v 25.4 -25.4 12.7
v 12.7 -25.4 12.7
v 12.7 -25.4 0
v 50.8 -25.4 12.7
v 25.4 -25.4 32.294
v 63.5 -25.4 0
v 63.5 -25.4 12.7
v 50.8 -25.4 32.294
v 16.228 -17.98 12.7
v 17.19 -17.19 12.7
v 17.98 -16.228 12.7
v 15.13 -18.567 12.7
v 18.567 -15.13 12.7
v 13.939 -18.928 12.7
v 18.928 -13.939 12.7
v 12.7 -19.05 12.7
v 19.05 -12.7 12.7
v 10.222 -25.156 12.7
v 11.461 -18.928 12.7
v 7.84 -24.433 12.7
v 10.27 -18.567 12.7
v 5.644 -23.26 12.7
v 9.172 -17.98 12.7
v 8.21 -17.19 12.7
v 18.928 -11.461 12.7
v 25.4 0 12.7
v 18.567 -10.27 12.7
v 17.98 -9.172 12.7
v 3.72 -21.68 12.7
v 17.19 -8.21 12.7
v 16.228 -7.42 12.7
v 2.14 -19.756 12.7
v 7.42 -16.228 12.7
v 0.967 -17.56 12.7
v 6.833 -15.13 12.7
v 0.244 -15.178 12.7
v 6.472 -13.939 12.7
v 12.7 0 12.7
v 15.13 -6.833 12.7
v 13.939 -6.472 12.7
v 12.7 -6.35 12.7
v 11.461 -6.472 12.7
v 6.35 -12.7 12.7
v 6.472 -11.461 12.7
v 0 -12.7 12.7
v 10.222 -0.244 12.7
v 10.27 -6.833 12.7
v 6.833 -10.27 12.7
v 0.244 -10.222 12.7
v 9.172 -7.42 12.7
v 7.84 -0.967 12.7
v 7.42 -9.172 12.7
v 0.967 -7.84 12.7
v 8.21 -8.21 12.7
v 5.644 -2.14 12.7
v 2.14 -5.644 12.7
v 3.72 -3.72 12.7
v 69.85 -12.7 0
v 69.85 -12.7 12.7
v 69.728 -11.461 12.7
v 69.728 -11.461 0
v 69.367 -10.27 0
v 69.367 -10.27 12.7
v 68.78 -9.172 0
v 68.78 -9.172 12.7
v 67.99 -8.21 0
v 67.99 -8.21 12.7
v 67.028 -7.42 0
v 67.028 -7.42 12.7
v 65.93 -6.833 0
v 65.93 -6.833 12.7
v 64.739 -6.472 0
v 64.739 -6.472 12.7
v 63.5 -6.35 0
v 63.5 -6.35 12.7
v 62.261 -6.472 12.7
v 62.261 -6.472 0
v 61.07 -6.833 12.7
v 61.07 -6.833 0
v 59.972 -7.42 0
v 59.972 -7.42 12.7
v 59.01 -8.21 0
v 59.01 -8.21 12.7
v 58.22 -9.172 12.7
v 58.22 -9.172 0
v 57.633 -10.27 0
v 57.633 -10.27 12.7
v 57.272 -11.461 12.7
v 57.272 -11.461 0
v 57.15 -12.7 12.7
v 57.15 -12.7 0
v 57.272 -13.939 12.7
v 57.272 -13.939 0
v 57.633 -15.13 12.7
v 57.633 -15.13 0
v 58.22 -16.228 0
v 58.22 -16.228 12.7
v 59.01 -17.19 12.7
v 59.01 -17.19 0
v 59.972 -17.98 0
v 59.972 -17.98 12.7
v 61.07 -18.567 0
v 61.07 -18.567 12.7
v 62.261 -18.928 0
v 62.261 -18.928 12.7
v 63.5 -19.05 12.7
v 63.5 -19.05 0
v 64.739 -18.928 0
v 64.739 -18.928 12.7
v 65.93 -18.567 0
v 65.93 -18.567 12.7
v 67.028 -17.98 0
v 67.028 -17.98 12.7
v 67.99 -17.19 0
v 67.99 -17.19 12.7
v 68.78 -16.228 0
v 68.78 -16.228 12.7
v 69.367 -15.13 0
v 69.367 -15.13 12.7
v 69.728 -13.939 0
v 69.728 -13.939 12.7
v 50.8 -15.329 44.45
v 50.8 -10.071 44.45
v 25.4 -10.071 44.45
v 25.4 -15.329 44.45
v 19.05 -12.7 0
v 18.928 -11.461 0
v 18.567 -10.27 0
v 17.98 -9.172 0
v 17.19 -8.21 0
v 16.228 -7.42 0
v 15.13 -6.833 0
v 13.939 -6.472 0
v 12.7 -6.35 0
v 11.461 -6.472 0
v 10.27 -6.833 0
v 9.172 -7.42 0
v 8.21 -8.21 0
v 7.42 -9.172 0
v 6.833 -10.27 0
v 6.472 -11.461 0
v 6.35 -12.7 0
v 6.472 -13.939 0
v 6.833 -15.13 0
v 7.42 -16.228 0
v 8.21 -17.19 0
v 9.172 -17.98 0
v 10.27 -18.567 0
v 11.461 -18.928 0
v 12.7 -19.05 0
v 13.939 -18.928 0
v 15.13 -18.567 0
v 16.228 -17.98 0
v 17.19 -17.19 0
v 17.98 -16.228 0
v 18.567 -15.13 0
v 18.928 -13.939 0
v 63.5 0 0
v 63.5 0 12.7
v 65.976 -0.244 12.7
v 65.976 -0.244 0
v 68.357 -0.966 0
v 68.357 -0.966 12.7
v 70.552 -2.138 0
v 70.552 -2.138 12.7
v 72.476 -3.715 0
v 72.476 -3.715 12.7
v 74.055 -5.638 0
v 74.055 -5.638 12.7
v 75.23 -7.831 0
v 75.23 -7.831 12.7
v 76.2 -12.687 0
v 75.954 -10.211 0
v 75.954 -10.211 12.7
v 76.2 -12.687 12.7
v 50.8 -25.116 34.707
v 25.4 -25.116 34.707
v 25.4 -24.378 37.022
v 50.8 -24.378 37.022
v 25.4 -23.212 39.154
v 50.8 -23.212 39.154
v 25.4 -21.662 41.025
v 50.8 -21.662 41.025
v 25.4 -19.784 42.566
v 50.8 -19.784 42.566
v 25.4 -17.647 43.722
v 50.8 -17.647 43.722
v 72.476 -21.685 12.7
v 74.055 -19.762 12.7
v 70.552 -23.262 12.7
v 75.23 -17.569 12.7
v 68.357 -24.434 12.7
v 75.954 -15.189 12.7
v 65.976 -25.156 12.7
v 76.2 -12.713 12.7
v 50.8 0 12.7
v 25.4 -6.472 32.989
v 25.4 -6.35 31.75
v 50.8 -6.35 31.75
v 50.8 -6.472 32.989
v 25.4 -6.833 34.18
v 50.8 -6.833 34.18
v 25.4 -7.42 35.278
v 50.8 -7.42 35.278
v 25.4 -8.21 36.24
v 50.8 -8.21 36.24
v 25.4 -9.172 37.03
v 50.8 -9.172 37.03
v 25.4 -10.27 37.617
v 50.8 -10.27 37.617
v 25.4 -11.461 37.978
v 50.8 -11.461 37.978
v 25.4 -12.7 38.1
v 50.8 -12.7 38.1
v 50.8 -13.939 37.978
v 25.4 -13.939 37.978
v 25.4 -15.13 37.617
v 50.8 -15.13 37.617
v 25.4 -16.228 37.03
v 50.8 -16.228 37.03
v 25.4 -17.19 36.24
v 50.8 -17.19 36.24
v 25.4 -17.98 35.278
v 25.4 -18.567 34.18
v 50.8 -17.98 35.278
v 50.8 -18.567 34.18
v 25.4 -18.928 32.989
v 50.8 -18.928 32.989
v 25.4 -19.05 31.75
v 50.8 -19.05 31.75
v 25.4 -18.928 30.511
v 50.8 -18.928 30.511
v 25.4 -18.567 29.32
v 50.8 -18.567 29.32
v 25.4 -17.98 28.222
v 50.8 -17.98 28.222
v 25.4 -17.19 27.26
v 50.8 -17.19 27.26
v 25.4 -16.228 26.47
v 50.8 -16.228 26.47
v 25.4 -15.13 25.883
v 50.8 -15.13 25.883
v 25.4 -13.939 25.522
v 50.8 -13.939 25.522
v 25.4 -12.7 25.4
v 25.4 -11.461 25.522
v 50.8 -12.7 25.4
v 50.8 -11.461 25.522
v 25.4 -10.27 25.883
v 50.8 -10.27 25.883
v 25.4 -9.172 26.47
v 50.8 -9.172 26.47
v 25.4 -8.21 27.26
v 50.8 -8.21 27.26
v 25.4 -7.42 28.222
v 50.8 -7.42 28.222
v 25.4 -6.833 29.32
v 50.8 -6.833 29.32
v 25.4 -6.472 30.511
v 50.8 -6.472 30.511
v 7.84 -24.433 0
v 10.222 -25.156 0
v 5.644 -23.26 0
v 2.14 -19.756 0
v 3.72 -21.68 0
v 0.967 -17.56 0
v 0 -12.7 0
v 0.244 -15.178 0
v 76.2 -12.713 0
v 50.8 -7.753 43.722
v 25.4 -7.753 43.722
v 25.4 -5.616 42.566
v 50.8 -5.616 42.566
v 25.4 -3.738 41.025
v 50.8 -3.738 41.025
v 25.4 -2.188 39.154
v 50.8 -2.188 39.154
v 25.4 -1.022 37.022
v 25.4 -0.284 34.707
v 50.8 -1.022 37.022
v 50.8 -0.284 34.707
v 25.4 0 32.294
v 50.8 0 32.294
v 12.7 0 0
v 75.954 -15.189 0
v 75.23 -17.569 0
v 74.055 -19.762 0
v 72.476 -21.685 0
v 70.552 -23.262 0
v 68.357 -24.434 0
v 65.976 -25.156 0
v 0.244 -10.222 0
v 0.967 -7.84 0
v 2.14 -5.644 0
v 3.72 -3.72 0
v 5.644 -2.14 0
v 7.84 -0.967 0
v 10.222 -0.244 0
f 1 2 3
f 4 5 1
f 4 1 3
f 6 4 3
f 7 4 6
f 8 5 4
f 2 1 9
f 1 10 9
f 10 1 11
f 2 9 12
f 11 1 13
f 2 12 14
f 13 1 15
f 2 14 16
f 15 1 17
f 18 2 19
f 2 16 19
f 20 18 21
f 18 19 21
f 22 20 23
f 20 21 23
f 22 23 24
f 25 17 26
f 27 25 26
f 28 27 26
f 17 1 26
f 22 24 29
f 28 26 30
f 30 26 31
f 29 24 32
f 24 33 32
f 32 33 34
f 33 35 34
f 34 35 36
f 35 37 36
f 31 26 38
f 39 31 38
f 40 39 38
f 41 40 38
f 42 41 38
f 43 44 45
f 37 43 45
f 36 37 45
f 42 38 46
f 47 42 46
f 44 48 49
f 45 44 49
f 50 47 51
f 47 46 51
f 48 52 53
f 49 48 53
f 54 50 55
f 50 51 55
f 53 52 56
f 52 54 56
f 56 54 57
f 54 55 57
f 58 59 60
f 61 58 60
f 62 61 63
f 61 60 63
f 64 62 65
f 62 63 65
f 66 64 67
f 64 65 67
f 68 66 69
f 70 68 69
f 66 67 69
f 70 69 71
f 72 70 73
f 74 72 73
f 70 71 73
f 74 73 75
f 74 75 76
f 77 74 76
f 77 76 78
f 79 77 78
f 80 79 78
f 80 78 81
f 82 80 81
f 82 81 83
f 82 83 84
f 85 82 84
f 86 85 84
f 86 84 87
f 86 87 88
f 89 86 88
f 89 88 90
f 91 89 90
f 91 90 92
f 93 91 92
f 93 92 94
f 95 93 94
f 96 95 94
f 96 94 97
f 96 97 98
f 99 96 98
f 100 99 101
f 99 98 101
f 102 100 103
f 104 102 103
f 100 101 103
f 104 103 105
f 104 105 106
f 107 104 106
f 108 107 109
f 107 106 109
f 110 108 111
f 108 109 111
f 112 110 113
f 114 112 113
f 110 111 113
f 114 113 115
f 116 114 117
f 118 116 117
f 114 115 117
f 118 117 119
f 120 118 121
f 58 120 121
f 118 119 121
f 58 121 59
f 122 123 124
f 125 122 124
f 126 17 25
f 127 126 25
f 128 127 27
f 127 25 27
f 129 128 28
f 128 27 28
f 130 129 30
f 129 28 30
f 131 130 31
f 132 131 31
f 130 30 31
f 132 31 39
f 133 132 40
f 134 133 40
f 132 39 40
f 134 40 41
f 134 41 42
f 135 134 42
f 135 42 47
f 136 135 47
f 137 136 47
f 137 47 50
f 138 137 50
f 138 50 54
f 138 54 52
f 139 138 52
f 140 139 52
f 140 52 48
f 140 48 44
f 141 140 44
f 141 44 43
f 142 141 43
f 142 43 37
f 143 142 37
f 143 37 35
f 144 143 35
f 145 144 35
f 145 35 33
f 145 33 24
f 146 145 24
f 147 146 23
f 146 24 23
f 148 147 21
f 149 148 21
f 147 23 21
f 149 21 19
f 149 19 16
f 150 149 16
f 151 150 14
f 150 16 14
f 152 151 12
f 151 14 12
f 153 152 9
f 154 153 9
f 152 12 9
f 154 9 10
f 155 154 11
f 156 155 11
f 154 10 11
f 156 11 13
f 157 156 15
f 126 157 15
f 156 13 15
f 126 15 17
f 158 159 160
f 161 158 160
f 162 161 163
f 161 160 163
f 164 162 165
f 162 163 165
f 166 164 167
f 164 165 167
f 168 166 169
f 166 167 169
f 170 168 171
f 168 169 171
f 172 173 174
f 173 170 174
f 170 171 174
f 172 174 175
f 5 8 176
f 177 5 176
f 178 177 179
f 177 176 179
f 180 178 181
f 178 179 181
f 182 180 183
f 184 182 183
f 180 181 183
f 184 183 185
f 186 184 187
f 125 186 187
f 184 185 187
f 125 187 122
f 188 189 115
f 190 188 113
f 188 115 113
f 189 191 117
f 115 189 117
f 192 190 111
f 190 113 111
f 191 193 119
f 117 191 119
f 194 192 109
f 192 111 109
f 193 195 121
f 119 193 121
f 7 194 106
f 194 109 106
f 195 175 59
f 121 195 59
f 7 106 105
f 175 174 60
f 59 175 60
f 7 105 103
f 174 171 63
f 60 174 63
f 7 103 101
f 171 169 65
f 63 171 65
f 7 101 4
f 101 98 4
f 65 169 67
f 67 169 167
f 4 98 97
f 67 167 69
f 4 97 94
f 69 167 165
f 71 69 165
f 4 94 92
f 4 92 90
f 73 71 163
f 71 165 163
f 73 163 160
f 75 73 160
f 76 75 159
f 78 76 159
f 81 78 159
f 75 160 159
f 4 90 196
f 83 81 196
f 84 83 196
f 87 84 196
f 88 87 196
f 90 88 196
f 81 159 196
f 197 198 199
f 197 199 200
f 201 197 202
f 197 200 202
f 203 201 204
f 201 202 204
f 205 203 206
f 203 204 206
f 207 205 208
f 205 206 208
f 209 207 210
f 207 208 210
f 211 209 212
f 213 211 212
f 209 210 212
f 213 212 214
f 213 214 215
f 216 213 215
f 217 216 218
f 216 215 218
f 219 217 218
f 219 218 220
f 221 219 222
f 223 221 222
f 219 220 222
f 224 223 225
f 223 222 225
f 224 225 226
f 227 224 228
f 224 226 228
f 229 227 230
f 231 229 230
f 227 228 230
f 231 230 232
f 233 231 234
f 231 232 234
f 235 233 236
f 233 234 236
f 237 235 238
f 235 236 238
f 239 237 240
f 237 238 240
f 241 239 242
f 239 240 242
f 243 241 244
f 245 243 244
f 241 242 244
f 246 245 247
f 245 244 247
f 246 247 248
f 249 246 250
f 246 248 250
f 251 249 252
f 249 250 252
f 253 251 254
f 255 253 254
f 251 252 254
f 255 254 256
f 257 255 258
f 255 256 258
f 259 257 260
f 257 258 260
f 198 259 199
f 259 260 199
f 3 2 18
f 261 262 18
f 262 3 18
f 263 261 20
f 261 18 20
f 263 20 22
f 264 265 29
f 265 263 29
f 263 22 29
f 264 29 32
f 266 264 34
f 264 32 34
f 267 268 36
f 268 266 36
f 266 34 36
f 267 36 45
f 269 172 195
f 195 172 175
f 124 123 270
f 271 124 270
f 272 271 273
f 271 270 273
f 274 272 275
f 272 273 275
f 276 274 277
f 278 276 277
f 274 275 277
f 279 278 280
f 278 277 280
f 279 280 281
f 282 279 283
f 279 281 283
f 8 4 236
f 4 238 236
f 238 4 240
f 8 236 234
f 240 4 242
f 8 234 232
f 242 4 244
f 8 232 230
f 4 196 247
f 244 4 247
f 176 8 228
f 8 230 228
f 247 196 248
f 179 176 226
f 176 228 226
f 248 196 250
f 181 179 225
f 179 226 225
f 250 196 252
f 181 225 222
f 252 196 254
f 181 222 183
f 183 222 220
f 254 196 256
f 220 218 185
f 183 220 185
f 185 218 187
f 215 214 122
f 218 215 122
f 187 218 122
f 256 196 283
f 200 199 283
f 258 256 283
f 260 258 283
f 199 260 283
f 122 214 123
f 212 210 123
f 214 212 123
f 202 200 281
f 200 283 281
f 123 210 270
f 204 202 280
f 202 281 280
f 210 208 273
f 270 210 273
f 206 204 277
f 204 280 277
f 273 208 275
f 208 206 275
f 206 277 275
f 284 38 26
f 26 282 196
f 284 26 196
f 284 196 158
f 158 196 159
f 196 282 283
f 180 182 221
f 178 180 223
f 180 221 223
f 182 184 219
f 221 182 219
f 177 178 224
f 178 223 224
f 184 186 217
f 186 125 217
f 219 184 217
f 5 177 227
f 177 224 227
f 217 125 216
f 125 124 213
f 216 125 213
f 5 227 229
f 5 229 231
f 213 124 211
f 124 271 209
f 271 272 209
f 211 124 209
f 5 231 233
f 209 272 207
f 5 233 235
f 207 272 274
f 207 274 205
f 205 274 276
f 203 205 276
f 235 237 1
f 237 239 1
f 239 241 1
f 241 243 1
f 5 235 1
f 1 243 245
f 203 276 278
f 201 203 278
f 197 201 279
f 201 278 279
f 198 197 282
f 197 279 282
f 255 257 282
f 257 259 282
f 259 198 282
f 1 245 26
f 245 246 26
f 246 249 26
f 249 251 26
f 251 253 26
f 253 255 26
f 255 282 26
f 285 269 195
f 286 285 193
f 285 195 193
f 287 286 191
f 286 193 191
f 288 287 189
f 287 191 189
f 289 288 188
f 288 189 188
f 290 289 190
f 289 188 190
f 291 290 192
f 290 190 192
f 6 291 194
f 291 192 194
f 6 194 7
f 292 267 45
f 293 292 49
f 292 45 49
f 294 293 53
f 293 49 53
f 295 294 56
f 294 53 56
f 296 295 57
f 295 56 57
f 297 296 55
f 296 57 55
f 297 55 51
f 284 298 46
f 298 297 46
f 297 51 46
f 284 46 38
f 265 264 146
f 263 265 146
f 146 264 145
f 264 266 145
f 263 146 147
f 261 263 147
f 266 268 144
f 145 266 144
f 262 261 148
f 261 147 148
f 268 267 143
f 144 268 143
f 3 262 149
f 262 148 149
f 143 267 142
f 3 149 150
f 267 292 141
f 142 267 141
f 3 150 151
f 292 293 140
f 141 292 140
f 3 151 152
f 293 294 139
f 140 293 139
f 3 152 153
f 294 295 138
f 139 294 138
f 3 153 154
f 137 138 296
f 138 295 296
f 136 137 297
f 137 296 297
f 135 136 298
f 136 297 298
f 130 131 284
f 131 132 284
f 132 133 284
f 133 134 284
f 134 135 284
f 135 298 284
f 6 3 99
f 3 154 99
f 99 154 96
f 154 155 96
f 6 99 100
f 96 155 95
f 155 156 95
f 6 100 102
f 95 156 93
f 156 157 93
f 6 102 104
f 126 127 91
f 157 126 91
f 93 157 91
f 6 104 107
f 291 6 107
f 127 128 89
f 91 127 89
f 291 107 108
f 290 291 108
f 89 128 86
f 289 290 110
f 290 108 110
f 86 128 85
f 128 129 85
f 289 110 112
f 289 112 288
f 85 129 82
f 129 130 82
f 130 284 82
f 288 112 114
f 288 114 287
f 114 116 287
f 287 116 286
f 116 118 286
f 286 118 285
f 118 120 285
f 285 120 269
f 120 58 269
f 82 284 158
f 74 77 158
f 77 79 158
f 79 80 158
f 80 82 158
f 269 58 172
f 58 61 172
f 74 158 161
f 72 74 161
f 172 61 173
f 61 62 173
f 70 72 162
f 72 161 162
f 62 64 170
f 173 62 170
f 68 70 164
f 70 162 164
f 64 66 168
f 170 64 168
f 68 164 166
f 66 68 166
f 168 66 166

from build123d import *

# Parameters (mm, degrees)
F1_DEPTH = 25.4
F2_R     = 6.35
F3_DEPTH = 25.4
F4_R     = 6.35
F5_DEPTH = 25.4
F6_R     = 6.35
F7_DEPTH = 25.4


# Not quite as in the source:
# - ends of sketch curves that miss each other by under 0.0002 mm in the source are joined


with BuildPart() as f1:
    # F0 (on Front) → F1 (new body)
    with BuildSketch(Plane.XZ):
        Polygon((0, 12.7), (0, 0), (76.2, 0), (76.2, 12.7), (50.8, 12.7), (50.8, 44.45), (25.4, 44.45), (25.4, 12.7), align=None)
    extrude(amount=F1_DEPTH)

    # F2 (on face) → F3 (cut)
    with BuildSketch(Plane.YZ.offset(50.8)):
        with BuildLine():
            ThreePointArc((-25.4, 32.294421317), (-22.4820111245, 40.1263057346), (-15.3294772723, 44.45))
            Line((-15.3294772723, 44.45), (-25.4, 44.45))
            Line((-25.4, 44.45), (-25.4, 32.294421317))
        make_face()
        with BuildLine():
            ThreePointArc((-10.0705227277, 44.45), (-2.9179888755, 40.1263057346), (0, 32.294421317))
            Line((0, 32.294421317), (0, 44.45))
            Line((0, 44.45), (-10.0705227277, 44.45))
        make_face()
        with Locations((-12.7, 31.75)):
            Circle(F2_R)
    extrude(amount=-F3_DEPTH, mode=Mode.SUBTRACT)

    # F4 (on face) → F5 (cut)
    with BuildSketch(Plane.XY.offset(12.7)):
        with BuildLine():
            ThreePointArc((63.5, -3.1832e-06), (72.4802600435, -3.7197427535), (76.2000063664, -12.7))
            Line((76.2000063664, -12.7), (76.2, 0))
            Line((76.2, 0), (63.5, -3.1832e-06))
        make_face()
        with BuildLine():
            ThreePointArc((76.2000063664, -12.7), (72.4802600435, -21.6802572465), (63.5, -25.3999968168))
            Line((63.5, -25.3999968168), (76.2, -25.4))
            Line((76.2, -25.4), (76.2000063664, -12.7))
        make_face()
        with Locations((63.5, -12.7)):
            Circle(F4_R)
    extrude(amount=-F5_DEPTH, mode=Mode.SUBTRACT)

    # F6 (on face) → F7 (cut)
    with BuildSketch(Plane.XY.offset(12.7)):
        with Locations((12.7, -12.7)):
            Circle(F6_R)
        with BuildLine():
            ThreePointArc((0, -12.7), (3.7197438789, -3.7197438789), (12.7, 0))
            Line((12.7, 0), (0, 0))
            Line((0, 0), (0, -12.7))
        make_face()
        with BuildLine():
            ThreePointArc((12.7, -25.4), (3.7197438789, -21.6802561211), (0, -12.7))
            Line((0, -12.7), (0, -25.4))
            Line((0, -25.4), (12.7, -25.4))
        make_face()
    extrude(amount=-F7_DEPTH, mode=Mode.SUBTRACT)


solid = f1.part
